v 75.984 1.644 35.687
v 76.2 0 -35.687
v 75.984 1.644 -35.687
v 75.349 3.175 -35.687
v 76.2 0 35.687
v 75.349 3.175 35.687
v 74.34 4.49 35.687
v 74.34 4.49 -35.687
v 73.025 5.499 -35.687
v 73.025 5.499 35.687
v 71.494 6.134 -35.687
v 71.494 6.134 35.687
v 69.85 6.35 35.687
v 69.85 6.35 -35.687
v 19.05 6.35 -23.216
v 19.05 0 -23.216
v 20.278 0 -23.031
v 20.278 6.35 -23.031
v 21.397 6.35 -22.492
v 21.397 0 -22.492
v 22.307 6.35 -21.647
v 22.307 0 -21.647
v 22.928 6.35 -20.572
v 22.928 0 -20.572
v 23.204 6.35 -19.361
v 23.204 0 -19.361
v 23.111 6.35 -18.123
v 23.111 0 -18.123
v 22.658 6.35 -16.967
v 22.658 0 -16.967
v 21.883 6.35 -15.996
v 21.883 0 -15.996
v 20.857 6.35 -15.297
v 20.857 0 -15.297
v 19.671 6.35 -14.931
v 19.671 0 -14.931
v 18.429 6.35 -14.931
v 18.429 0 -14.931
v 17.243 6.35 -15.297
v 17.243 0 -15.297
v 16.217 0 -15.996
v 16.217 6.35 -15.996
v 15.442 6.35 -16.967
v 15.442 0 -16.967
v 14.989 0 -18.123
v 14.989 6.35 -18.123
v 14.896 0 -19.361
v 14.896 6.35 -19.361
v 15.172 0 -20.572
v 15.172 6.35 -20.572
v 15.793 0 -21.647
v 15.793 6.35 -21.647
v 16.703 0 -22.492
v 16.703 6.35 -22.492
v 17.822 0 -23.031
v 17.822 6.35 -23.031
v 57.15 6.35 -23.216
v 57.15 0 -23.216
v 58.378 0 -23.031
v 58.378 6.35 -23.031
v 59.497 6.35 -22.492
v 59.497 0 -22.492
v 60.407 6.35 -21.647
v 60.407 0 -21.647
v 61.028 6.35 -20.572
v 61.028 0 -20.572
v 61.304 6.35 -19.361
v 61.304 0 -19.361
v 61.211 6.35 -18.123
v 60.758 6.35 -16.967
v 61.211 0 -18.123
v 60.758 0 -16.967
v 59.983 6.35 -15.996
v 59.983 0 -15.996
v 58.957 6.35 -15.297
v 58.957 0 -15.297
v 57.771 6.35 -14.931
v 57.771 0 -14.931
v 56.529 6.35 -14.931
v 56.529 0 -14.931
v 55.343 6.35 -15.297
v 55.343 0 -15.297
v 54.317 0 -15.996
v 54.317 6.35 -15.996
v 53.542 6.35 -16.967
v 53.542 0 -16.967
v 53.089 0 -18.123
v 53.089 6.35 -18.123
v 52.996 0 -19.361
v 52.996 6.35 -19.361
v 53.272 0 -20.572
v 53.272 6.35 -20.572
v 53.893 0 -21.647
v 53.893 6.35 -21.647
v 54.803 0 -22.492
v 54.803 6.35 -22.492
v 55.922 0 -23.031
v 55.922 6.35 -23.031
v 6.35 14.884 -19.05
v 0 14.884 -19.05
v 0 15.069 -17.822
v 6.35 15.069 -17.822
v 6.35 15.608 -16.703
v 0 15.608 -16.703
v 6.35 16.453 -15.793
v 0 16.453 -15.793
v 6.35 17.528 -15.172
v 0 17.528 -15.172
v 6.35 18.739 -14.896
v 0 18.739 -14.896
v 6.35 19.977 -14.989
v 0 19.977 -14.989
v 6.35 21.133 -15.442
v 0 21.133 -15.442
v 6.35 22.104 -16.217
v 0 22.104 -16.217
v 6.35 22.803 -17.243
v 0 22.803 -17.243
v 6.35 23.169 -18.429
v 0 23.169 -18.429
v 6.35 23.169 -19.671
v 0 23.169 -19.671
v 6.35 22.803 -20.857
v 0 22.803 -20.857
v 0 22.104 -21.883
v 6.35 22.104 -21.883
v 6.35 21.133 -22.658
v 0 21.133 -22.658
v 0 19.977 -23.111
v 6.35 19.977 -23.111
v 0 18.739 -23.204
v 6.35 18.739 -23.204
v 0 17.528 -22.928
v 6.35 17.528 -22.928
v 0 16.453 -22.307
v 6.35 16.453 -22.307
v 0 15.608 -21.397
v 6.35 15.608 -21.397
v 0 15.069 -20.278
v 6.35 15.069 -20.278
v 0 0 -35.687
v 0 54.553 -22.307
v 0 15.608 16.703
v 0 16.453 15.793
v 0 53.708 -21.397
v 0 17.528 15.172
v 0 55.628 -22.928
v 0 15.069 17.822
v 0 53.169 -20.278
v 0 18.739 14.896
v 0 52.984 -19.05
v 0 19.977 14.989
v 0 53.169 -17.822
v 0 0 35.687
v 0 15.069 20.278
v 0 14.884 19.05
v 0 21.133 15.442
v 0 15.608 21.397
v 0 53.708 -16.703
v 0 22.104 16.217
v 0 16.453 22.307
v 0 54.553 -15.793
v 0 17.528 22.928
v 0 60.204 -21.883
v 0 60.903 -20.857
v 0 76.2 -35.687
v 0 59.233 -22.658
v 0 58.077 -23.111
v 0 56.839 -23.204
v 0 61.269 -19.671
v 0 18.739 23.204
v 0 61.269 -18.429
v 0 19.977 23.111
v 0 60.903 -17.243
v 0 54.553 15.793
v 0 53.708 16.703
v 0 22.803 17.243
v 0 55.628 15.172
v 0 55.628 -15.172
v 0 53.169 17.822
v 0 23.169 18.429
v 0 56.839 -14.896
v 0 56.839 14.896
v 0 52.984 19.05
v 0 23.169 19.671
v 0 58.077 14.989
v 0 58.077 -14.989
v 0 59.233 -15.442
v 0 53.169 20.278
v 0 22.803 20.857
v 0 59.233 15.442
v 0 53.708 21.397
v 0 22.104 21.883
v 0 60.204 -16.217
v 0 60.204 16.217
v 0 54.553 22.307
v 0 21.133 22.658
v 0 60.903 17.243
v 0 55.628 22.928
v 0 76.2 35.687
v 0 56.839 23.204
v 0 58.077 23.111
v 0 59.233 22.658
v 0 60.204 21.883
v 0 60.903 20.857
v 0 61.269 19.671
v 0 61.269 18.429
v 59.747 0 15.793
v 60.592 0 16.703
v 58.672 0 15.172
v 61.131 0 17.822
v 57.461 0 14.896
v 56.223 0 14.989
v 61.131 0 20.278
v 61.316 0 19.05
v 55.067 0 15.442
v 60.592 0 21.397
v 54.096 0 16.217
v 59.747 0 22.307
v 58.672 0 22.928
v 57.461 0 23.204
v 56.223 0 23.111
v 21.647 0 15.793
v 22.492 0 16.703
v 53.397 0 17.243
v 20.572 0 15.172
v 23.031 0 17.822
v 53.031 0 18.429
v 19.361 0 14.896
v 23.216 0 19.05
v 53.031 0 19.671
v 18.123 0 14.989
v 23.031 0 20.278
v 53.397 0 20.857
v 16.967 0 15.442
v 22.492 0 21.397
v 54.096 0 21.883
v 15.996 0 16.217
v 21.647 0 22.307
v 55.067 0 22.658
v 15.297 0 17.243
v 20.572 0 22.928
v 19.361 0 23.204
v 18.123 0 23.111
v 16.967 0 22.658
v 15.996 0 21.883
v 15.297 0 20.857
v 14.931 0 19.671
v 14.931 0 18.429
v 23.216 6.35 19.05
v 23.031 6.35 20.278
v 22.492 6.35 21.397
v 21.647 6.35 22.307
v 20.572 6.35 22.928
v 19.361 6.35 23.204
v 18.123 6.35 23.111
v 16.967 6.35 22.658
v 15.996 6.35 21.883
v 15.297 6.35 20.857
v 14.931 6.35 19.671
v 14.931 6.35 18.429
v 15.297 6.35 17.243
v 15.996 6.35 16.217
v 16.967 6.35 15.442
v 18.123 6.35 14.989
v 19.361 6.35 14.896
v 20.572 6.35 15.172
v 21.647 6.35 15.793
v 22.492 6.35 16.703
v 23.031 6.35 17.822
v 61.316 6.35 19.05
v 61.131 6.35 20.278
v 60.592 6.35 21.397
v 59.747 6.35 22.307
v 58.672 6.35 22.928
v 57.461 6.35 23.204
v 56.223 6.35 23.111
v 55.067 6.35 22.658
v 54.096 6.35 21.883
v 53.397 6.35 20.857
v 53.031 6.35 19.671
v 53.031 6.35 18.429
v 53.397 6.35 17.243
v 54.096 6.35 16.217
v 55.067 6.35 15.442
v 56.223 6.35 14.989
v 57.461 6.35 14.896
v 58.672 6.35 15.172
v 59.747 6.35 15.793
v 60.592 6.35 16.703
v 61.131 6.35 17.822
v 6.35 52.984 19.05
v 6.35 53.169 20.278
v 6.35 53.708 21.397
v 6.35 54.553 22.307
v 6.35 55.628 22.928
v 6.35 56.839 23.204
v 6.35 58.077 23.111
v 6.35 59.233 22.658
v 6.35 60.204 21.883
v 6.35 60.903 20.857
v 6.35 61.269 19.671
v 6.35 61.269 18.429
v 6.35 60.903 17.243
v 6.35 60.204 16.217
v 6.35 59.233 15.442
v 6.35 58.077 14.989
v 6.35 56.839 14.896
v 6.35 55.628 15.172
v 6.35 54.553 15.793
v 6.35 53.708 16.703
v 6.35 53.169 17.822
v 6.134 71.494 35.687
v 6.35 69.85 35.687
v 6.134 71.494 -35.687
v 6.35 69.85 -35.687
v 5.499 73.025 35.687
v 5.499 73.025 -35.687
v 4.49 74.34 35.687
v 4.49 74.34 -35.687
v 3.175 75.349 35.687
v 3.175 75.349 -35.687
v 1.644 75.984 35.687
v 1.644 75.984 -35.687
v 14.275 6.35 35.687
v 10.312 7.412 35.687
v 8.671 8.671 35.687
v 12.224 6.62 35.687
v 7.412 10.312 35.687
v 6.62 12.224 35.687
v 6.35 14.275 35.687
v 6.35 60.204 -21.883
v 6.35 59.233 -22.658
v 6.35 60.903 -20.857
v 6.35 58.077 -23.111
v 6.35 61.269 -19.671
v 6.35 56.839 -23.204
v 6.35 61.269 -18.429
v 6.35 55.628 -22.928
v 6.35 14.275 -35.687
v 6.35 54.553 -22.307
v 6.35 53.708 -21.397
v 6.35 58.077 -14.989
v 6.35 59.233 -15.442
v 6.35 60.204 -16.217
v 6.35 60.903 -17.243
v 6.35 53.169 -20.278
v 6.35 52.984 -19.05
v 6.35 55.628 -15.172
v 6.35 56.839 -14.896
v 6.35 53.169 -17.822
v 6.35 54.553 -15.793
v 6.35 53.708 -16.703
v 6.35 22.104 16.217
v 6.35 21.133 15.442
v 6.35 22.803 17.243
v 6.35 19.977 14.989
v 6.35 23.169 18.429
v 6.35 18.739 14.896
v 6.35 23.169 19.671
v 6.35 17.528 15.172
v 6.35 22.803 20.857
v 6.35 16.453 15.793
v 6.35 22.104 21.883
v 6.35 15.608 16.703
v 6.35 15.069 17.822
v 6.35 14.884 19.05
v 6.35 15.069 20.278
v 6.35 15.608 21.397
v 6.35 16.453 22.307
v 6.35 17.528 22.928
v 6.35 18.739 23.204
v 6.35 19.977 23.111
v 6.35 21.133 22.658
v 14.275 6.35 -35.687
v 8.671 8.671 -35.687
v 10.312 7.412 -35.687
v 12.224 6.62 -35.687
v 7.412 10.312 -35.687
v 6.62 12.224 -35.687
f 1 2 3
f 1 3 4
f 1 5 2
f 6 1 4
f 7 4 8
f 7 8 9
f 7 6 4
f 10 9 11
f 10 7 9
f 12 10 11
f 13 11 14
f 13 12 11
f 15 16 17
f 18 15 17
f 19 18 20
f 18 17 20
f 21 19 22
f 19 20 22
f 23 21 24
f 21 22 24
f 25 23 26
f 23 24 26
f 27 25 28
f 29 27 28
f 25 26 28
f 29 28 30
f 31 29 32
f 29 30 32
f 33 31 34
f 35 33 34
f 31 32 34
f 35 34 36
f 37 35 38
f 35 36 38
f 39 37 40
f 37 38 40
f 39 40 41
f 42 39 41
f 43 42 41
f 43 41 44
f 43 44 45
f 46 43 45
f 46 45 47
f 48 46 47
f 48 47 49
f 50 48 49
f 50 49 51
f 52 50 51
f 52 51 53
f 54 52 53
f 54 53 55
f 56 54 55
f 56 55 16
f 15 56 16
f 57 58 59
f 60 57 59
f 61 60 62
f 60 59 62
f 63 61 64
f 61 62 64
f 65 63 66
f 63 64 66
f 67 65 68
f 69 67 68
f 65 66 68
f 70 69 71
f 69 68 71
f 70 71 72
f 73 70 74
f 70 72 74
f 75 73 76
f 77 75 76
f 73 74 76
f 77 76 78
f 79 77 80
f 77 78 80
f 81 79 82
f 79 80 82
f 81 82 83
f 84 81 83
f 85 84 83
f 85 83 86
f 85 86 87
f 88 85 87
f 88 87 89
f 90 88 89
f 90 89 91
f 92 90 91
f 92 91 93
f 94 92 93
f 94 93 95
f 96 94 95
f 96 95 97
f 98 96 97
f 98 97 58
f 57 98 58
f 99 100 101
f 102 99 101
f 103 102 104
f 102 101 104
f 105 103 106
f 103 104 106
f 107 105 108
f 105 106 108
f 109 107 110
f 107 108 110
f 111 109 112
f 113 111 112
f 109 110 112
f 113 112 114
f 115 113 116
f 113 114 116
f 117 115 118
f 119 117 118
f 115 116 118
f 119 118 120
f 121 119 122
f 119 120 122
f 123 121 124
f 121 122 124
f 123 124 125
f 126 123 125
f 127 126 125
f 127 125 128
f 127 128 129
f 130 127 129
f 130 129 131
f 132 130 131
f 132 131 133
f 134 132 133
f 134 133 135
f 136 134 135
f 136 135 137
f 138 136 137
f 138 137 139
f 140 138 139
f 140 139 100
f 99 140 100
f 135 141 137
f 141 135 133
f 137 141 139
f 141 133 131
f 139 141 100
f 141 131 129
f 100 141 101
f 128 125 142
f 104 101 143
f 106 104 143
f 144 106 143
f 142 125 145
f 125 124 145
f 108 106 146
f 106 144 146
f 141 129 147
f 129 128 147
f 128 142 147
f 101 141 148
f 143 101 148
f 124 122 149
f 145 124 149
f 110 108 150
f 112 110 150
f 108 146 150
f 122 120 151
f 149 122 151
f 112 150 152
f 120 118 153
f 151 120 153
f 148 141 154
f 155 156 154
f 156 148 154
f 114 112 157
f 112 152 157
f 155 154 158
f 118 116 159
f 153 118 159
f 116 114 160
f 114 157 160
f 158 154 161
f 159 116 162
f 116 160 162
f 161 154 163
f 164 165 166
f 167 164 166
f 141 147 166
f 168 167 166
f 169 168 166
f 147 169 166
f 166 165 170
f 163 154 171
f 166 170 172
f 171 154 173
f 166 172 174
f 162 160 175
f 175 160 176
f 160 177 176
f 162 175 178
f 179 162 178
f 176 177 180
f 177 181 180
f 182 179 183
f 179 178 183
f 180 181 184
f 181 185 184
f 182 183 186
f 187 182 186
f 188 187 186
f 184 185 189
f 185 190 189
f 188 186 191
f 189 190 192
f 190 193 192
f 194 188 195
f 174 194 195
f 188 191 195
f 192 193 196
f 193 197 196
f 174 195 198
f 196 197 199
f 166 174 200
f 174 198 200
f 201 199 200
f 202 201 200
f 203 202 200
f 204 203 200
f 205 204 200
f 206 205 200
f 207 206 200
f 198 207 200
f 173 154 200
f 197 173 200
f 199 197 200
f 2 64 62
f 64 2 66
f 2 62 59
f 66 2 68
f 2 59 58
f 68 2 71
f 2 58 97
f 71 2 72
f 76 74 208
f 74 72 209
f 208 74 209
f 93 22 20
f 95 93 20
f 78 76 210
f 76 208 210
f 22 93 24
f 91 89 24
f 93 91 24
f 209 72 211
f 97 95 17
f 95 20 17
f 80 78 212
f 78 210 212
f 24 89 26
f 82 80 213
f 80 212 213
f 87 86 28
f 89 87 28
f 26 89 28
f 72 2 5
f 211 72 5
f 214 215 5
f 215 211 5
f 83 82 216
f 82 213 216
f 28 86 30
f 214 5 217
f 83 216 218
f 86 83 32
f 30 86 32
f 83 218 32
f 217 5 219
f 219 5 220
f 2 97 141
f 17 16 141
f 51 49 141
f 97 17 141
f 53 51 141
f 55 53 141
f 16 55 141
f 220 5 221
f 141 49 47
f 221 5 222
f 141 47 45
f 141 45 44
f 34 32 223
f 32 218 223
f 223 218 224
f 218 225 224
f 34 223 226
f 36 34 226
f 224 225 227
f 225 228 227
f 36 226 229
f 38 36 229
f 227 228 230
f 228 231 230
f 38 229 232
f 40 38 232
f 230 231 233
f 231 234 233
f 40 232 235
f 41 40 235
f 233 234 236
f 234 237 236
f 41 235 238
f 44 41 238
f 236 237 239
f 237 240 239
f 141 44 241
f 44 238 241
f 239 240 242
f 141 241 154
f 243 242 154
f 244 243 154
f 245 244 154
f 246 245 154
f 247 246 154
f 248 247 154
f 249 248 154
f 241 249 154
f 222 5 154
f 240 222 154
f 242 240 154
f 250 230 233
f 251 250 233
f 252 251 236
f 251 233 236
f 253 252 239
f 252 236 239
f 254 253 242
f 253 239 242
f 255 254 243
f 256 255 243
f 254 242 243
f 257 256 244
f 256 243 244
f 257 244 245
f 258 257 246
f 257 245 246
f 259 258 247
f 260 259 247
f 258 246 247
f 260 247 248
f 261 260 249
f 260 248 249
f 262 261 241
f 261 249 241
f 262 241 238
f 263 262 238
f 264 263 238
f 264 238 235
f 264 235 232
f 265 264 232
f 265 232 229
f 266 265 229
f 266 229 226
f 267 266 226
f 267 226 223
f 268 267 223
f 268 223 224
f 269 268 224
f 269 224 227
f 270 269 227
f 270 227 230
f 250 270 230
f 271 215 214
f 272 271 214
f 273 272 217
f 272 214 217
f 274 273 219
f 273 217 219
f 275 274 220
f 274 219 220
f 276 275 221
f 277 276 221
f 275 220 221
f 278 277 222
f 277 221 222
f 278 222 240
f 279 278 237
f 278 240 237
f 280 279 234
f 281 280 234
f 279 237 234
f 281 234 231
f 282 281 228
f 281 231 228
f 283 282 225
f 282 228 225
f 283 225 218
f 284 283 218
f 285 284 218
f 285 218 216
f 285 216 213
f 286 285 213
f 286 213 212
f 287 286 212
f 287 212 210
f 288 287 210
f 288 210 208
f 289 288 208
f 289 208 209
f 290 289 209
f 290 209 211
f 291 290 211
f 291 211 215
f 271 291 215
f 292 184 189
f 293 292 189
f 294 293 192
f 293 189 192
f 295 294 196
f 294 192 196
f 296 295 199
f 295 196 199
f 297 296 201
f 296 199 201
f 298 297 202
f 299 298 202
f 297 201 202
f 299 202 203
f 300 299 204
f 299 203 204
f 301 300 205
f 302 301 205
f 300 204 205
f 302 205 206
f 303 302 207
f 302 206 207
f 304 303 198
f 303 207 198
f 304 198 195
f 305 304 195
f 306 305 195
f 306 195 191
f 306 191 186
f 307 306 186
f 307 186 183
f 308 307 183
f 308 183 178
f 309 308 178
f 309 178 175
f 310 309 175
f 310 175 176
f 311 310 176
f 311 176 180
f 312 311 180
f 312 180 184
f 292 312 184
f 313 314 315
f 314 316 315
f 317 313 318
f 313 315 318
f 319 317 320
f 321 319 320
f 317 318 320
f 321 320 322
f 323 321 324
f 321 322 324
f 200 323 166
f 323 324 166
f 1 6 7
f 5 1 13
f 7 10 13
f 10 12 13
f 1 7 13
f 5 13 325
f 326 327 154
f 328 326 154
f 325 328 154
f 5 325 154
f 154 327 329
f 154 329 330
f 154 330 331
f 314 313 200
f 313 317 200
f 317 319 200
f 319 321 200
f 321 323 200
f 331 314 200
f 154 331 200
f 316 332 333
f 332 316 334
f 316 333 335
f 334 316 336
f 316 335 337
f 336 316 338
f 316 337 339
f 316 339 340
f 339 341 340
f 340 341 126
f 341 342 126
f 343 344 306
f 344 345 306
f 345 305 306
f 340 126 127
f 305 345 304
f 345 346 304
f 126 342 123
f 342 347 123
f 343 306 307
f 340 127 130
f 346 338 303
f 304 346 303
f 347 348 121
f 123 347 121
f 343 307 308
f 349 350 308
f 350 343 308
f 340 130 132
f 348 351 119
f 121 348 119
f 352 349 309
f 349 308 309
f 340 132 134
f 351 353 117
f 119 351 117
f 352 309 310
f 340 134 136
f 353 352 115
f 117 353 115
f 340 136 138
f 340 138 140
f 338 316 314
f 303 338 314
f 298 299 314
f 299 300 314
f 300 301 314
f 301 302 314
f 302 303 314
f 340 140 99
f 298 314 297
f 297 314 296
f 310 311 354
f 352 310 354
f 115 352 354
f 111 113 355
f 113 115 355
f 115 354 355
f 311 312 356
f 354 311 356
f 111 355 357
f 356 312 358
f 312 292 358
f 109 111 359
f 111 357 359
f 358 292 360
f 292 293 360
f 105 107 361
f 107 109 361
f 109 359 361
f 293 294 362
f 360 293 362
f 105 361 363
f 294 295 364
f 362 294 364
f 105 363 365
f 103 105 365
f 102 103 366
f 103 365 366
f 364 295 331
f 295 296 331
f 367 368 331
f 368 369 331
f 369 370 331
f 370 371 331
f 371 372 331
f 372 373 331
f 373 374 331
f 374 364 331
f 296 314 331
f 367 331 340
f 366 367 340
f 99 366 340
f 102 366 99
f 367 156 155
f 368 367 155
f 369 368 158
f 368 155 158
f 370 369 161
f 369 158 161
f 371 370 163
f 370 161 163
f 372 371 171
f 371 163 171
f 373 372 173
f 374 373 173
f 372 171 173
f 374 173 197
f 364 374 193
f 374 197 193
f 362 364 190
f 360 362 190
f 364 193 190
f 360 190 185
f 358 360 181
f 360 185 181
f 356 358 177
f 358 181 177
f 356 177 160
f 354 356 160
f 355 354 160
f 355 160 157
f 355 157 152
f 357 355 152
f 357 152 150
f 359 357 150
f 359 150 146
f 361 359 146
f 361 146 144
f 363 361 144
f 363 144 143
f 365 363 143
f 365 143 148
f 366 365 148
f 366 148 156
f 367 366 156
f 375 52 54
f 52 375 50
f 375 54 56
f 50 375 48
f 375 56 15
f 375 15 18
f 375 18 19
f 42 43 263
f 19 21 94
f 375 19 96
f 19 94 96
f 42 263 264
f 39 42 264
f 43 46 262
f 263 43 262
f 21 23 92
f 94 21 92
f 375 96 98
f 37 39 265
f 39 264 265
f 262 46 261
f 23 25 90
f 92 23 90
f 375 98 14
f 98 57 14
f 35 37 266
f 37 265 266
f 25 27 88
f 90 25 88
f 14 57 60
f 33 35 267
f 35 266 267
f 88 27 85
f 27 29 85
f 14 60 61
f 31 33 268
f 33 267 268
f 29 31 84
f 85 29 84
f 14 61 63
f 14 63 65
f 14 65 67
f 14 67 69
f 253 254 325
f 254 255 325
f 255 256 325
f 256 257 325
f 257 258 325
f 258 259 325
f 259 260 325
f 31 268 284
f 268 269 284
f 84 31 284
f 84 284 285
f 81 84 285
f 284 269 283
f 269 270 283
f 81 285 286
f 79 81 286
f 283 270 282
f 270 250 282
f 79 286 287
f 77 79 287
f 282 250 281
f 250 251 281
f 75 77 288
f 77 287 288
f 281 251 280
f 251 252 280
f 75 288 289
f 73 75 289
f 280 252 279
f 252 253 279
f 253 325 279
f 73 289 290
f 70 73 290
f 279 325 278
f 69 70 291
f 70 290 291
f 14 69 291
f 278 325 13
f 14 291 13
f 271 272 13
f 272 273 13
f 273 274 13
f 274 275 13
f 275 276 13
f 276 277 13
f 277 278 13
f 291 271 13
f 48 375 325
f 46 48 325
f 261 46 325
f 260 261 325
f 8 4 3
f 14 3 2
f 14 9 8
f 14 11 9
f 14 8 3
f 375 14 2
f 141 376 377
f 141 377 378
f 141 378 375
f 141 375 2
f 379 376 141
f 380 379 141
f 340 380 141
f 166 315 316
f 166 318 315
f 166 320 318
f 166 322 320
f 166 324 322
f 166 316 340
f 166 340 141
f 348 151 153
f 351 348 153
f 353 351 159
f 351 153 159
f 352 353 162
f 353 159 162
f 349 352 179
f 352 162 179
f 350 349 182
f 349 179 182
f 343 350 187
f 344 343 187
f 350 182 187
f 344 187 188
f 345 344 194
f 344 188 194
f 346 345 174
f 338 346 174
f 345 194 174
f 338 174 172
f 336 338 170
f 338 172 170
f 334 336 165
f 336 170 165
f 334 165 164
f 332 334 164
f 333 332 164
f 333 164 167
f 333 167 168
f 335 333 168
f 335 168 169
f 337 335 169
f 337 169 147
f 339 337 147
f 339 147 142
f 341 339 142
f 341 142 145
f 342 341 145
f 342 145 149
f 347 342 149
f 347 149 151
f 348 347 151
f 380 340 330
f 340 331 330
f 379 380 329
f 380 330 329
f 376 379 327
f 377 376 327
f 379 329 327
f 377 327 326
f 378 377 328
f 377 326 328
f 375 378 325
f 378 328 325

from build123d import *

# Parameters (mm, degrees)
BOSS_EXTRUDE1_DEPTH = 35.687
FILLET1_R           = 6.35
SKETCH3_R           = 4.1656
CUT_EXTRUDE1_DEPTH  = 114.518465322
CUT_EXTRUDE2_REACH  = 115.518
SKETCH4_R           = 4.1656


with BuildPart() as part:
    # Sketch2 → Boss-Extrude1 (new, symmetric)
    with BuildSketch(Plane.XY):
        with BuildLine():
            Line((0, 0), (0, 76.2))
            Line((0, 76.2), (6.35, 76.2))
            Line((6.35, 76.2), (6.35, 14.2748))
            ThreePointArc((6.35, 14.2748), (8.67112018, 8.67112018), (14.2748, 6.35))
            Line((14.2748, 6.35), (76.2, 6.35))
            Line((76.2, 6.35), (76.2, 0))
            Line((76.2, 0), (0, 0))
        make_face()
    extrude(amount=BOSS_EXTRUDE1_DEPTH, both=True)

    # Fillet1
    fillet1_edges = [part.edges().sort_by_distance(p)[0] for p in [
        (76.2, 6.35, 0),
        (6.35, 76.2, 0),
    ]]
    fillet(fillet1_edges, radius=FILLET1_R - 0.0001)  # a hair under: the kernel refuses the full size

    # Sketch3 → Cut-Extrude1 (cut, through all)
    with BuildSketch(Plane.ZY):
        with Locations(Location((-19.05, 57.15, 0), (0, 0, 270))):
            Circle(SKETCH3_R)
        with Locations(Location((-19.05, 19.05, 0), (0, 0, 270))):
            Circle(SKETCH3_R)
        with Locations(Location((19.05, 19.05, 0), (0, 0, 270))):
            Circle(SKETCH3_R)
        with Locations(Location((19.05, 57.15, 0), (0, 0, 270))):
            Circle(SKETCH3_R)
    extrude(amount=-CUT_EXTRUDE1_DEPTH, mode=Mode.SUBTRACT)

    # Sketch4 → Cut-Extrude2 (cut, up to next)
    with BuildSketch(Plane.XZ, mode=Mode.PRIVATE) as cut_extrude2_sk1:
        with Locations((57.15, 19.05)):
            Circle(SKETCH4_R)
    cut_extrude2_tool1 = extrude(cut_extrude2_sk1.sketch, amount=-CUT_EXTRUDE2_REACH, mode=Mode.PRIVATE) & part.part
    # Sketch4 → Cut-Extrude2 (cut, up to next)
    with BuildSketch(Plane.XZ, mode=Mode.PRIVATE) as cut_extrude2_sk2:
        with Locations(Location((19.05, -19.05, 0), (0, 0, 270))):
            Circle(SKETCH4_R)
    cut_extrude2_tool2 = extrude(cut_extrude2_sk2.sketch, amount=-CUT_EXTRUDE2_REACH, mode=Mode.PRIVATE) & part.part
    # Sketch4 → Cut-Extrude2 (cut, up to next)
    with BuildSketch(Plane.XZ, mode=Mode.PRIVATE) as cut_extrude2_sk3:
        with Locations(Location((57.15, -19.05, 0), (0, 0, 270))):
            Circle(SKETCH4_R)
    cut_extrude2_tool3 = extrude(cut_extrude2_sk3.sketch, amount=-CUT_EXTRUDE2_REACH, mode=Mode.PRIVATE) & part.part
    # Sketch4 → Cut-Extrude2 (cut, up to next)
    with BuildSketch(Plane.XZ, mode=Mode.PRIVATE) as cut_extrude2_sk4:
        with Locations((19.05, 19.05)):
            Circle(SKETCH4_R)
    cut_extrude2_tool4 = extrude(cut_extrude2_sk4.sketch, amount=-CUT_EXTRUDE2_REACH, mode=Mode.PRIVATE) & part.part
    add(cut_extrude2_tool1.solids().sort_by_distance((57.15, 0, 19.05))[0], mode=Mode.SUBTRACT)
    add(cut_extrude2_tool2.solids().sort_by_distance((19.05, 0, -19.05))[0], mode=Mode.SUBTRACT)
    add(cut_extrude2_tool3.solids().sort_by_distance((57.15, 0, -19.05))[0], mode=Mode.SUBTRACT)
    add(cut_extrude2_tool4.solids().sort_by_distance((19.05, 0, 19.05))[0], mode=Mode.SUBTRACT)


solid = part.part
